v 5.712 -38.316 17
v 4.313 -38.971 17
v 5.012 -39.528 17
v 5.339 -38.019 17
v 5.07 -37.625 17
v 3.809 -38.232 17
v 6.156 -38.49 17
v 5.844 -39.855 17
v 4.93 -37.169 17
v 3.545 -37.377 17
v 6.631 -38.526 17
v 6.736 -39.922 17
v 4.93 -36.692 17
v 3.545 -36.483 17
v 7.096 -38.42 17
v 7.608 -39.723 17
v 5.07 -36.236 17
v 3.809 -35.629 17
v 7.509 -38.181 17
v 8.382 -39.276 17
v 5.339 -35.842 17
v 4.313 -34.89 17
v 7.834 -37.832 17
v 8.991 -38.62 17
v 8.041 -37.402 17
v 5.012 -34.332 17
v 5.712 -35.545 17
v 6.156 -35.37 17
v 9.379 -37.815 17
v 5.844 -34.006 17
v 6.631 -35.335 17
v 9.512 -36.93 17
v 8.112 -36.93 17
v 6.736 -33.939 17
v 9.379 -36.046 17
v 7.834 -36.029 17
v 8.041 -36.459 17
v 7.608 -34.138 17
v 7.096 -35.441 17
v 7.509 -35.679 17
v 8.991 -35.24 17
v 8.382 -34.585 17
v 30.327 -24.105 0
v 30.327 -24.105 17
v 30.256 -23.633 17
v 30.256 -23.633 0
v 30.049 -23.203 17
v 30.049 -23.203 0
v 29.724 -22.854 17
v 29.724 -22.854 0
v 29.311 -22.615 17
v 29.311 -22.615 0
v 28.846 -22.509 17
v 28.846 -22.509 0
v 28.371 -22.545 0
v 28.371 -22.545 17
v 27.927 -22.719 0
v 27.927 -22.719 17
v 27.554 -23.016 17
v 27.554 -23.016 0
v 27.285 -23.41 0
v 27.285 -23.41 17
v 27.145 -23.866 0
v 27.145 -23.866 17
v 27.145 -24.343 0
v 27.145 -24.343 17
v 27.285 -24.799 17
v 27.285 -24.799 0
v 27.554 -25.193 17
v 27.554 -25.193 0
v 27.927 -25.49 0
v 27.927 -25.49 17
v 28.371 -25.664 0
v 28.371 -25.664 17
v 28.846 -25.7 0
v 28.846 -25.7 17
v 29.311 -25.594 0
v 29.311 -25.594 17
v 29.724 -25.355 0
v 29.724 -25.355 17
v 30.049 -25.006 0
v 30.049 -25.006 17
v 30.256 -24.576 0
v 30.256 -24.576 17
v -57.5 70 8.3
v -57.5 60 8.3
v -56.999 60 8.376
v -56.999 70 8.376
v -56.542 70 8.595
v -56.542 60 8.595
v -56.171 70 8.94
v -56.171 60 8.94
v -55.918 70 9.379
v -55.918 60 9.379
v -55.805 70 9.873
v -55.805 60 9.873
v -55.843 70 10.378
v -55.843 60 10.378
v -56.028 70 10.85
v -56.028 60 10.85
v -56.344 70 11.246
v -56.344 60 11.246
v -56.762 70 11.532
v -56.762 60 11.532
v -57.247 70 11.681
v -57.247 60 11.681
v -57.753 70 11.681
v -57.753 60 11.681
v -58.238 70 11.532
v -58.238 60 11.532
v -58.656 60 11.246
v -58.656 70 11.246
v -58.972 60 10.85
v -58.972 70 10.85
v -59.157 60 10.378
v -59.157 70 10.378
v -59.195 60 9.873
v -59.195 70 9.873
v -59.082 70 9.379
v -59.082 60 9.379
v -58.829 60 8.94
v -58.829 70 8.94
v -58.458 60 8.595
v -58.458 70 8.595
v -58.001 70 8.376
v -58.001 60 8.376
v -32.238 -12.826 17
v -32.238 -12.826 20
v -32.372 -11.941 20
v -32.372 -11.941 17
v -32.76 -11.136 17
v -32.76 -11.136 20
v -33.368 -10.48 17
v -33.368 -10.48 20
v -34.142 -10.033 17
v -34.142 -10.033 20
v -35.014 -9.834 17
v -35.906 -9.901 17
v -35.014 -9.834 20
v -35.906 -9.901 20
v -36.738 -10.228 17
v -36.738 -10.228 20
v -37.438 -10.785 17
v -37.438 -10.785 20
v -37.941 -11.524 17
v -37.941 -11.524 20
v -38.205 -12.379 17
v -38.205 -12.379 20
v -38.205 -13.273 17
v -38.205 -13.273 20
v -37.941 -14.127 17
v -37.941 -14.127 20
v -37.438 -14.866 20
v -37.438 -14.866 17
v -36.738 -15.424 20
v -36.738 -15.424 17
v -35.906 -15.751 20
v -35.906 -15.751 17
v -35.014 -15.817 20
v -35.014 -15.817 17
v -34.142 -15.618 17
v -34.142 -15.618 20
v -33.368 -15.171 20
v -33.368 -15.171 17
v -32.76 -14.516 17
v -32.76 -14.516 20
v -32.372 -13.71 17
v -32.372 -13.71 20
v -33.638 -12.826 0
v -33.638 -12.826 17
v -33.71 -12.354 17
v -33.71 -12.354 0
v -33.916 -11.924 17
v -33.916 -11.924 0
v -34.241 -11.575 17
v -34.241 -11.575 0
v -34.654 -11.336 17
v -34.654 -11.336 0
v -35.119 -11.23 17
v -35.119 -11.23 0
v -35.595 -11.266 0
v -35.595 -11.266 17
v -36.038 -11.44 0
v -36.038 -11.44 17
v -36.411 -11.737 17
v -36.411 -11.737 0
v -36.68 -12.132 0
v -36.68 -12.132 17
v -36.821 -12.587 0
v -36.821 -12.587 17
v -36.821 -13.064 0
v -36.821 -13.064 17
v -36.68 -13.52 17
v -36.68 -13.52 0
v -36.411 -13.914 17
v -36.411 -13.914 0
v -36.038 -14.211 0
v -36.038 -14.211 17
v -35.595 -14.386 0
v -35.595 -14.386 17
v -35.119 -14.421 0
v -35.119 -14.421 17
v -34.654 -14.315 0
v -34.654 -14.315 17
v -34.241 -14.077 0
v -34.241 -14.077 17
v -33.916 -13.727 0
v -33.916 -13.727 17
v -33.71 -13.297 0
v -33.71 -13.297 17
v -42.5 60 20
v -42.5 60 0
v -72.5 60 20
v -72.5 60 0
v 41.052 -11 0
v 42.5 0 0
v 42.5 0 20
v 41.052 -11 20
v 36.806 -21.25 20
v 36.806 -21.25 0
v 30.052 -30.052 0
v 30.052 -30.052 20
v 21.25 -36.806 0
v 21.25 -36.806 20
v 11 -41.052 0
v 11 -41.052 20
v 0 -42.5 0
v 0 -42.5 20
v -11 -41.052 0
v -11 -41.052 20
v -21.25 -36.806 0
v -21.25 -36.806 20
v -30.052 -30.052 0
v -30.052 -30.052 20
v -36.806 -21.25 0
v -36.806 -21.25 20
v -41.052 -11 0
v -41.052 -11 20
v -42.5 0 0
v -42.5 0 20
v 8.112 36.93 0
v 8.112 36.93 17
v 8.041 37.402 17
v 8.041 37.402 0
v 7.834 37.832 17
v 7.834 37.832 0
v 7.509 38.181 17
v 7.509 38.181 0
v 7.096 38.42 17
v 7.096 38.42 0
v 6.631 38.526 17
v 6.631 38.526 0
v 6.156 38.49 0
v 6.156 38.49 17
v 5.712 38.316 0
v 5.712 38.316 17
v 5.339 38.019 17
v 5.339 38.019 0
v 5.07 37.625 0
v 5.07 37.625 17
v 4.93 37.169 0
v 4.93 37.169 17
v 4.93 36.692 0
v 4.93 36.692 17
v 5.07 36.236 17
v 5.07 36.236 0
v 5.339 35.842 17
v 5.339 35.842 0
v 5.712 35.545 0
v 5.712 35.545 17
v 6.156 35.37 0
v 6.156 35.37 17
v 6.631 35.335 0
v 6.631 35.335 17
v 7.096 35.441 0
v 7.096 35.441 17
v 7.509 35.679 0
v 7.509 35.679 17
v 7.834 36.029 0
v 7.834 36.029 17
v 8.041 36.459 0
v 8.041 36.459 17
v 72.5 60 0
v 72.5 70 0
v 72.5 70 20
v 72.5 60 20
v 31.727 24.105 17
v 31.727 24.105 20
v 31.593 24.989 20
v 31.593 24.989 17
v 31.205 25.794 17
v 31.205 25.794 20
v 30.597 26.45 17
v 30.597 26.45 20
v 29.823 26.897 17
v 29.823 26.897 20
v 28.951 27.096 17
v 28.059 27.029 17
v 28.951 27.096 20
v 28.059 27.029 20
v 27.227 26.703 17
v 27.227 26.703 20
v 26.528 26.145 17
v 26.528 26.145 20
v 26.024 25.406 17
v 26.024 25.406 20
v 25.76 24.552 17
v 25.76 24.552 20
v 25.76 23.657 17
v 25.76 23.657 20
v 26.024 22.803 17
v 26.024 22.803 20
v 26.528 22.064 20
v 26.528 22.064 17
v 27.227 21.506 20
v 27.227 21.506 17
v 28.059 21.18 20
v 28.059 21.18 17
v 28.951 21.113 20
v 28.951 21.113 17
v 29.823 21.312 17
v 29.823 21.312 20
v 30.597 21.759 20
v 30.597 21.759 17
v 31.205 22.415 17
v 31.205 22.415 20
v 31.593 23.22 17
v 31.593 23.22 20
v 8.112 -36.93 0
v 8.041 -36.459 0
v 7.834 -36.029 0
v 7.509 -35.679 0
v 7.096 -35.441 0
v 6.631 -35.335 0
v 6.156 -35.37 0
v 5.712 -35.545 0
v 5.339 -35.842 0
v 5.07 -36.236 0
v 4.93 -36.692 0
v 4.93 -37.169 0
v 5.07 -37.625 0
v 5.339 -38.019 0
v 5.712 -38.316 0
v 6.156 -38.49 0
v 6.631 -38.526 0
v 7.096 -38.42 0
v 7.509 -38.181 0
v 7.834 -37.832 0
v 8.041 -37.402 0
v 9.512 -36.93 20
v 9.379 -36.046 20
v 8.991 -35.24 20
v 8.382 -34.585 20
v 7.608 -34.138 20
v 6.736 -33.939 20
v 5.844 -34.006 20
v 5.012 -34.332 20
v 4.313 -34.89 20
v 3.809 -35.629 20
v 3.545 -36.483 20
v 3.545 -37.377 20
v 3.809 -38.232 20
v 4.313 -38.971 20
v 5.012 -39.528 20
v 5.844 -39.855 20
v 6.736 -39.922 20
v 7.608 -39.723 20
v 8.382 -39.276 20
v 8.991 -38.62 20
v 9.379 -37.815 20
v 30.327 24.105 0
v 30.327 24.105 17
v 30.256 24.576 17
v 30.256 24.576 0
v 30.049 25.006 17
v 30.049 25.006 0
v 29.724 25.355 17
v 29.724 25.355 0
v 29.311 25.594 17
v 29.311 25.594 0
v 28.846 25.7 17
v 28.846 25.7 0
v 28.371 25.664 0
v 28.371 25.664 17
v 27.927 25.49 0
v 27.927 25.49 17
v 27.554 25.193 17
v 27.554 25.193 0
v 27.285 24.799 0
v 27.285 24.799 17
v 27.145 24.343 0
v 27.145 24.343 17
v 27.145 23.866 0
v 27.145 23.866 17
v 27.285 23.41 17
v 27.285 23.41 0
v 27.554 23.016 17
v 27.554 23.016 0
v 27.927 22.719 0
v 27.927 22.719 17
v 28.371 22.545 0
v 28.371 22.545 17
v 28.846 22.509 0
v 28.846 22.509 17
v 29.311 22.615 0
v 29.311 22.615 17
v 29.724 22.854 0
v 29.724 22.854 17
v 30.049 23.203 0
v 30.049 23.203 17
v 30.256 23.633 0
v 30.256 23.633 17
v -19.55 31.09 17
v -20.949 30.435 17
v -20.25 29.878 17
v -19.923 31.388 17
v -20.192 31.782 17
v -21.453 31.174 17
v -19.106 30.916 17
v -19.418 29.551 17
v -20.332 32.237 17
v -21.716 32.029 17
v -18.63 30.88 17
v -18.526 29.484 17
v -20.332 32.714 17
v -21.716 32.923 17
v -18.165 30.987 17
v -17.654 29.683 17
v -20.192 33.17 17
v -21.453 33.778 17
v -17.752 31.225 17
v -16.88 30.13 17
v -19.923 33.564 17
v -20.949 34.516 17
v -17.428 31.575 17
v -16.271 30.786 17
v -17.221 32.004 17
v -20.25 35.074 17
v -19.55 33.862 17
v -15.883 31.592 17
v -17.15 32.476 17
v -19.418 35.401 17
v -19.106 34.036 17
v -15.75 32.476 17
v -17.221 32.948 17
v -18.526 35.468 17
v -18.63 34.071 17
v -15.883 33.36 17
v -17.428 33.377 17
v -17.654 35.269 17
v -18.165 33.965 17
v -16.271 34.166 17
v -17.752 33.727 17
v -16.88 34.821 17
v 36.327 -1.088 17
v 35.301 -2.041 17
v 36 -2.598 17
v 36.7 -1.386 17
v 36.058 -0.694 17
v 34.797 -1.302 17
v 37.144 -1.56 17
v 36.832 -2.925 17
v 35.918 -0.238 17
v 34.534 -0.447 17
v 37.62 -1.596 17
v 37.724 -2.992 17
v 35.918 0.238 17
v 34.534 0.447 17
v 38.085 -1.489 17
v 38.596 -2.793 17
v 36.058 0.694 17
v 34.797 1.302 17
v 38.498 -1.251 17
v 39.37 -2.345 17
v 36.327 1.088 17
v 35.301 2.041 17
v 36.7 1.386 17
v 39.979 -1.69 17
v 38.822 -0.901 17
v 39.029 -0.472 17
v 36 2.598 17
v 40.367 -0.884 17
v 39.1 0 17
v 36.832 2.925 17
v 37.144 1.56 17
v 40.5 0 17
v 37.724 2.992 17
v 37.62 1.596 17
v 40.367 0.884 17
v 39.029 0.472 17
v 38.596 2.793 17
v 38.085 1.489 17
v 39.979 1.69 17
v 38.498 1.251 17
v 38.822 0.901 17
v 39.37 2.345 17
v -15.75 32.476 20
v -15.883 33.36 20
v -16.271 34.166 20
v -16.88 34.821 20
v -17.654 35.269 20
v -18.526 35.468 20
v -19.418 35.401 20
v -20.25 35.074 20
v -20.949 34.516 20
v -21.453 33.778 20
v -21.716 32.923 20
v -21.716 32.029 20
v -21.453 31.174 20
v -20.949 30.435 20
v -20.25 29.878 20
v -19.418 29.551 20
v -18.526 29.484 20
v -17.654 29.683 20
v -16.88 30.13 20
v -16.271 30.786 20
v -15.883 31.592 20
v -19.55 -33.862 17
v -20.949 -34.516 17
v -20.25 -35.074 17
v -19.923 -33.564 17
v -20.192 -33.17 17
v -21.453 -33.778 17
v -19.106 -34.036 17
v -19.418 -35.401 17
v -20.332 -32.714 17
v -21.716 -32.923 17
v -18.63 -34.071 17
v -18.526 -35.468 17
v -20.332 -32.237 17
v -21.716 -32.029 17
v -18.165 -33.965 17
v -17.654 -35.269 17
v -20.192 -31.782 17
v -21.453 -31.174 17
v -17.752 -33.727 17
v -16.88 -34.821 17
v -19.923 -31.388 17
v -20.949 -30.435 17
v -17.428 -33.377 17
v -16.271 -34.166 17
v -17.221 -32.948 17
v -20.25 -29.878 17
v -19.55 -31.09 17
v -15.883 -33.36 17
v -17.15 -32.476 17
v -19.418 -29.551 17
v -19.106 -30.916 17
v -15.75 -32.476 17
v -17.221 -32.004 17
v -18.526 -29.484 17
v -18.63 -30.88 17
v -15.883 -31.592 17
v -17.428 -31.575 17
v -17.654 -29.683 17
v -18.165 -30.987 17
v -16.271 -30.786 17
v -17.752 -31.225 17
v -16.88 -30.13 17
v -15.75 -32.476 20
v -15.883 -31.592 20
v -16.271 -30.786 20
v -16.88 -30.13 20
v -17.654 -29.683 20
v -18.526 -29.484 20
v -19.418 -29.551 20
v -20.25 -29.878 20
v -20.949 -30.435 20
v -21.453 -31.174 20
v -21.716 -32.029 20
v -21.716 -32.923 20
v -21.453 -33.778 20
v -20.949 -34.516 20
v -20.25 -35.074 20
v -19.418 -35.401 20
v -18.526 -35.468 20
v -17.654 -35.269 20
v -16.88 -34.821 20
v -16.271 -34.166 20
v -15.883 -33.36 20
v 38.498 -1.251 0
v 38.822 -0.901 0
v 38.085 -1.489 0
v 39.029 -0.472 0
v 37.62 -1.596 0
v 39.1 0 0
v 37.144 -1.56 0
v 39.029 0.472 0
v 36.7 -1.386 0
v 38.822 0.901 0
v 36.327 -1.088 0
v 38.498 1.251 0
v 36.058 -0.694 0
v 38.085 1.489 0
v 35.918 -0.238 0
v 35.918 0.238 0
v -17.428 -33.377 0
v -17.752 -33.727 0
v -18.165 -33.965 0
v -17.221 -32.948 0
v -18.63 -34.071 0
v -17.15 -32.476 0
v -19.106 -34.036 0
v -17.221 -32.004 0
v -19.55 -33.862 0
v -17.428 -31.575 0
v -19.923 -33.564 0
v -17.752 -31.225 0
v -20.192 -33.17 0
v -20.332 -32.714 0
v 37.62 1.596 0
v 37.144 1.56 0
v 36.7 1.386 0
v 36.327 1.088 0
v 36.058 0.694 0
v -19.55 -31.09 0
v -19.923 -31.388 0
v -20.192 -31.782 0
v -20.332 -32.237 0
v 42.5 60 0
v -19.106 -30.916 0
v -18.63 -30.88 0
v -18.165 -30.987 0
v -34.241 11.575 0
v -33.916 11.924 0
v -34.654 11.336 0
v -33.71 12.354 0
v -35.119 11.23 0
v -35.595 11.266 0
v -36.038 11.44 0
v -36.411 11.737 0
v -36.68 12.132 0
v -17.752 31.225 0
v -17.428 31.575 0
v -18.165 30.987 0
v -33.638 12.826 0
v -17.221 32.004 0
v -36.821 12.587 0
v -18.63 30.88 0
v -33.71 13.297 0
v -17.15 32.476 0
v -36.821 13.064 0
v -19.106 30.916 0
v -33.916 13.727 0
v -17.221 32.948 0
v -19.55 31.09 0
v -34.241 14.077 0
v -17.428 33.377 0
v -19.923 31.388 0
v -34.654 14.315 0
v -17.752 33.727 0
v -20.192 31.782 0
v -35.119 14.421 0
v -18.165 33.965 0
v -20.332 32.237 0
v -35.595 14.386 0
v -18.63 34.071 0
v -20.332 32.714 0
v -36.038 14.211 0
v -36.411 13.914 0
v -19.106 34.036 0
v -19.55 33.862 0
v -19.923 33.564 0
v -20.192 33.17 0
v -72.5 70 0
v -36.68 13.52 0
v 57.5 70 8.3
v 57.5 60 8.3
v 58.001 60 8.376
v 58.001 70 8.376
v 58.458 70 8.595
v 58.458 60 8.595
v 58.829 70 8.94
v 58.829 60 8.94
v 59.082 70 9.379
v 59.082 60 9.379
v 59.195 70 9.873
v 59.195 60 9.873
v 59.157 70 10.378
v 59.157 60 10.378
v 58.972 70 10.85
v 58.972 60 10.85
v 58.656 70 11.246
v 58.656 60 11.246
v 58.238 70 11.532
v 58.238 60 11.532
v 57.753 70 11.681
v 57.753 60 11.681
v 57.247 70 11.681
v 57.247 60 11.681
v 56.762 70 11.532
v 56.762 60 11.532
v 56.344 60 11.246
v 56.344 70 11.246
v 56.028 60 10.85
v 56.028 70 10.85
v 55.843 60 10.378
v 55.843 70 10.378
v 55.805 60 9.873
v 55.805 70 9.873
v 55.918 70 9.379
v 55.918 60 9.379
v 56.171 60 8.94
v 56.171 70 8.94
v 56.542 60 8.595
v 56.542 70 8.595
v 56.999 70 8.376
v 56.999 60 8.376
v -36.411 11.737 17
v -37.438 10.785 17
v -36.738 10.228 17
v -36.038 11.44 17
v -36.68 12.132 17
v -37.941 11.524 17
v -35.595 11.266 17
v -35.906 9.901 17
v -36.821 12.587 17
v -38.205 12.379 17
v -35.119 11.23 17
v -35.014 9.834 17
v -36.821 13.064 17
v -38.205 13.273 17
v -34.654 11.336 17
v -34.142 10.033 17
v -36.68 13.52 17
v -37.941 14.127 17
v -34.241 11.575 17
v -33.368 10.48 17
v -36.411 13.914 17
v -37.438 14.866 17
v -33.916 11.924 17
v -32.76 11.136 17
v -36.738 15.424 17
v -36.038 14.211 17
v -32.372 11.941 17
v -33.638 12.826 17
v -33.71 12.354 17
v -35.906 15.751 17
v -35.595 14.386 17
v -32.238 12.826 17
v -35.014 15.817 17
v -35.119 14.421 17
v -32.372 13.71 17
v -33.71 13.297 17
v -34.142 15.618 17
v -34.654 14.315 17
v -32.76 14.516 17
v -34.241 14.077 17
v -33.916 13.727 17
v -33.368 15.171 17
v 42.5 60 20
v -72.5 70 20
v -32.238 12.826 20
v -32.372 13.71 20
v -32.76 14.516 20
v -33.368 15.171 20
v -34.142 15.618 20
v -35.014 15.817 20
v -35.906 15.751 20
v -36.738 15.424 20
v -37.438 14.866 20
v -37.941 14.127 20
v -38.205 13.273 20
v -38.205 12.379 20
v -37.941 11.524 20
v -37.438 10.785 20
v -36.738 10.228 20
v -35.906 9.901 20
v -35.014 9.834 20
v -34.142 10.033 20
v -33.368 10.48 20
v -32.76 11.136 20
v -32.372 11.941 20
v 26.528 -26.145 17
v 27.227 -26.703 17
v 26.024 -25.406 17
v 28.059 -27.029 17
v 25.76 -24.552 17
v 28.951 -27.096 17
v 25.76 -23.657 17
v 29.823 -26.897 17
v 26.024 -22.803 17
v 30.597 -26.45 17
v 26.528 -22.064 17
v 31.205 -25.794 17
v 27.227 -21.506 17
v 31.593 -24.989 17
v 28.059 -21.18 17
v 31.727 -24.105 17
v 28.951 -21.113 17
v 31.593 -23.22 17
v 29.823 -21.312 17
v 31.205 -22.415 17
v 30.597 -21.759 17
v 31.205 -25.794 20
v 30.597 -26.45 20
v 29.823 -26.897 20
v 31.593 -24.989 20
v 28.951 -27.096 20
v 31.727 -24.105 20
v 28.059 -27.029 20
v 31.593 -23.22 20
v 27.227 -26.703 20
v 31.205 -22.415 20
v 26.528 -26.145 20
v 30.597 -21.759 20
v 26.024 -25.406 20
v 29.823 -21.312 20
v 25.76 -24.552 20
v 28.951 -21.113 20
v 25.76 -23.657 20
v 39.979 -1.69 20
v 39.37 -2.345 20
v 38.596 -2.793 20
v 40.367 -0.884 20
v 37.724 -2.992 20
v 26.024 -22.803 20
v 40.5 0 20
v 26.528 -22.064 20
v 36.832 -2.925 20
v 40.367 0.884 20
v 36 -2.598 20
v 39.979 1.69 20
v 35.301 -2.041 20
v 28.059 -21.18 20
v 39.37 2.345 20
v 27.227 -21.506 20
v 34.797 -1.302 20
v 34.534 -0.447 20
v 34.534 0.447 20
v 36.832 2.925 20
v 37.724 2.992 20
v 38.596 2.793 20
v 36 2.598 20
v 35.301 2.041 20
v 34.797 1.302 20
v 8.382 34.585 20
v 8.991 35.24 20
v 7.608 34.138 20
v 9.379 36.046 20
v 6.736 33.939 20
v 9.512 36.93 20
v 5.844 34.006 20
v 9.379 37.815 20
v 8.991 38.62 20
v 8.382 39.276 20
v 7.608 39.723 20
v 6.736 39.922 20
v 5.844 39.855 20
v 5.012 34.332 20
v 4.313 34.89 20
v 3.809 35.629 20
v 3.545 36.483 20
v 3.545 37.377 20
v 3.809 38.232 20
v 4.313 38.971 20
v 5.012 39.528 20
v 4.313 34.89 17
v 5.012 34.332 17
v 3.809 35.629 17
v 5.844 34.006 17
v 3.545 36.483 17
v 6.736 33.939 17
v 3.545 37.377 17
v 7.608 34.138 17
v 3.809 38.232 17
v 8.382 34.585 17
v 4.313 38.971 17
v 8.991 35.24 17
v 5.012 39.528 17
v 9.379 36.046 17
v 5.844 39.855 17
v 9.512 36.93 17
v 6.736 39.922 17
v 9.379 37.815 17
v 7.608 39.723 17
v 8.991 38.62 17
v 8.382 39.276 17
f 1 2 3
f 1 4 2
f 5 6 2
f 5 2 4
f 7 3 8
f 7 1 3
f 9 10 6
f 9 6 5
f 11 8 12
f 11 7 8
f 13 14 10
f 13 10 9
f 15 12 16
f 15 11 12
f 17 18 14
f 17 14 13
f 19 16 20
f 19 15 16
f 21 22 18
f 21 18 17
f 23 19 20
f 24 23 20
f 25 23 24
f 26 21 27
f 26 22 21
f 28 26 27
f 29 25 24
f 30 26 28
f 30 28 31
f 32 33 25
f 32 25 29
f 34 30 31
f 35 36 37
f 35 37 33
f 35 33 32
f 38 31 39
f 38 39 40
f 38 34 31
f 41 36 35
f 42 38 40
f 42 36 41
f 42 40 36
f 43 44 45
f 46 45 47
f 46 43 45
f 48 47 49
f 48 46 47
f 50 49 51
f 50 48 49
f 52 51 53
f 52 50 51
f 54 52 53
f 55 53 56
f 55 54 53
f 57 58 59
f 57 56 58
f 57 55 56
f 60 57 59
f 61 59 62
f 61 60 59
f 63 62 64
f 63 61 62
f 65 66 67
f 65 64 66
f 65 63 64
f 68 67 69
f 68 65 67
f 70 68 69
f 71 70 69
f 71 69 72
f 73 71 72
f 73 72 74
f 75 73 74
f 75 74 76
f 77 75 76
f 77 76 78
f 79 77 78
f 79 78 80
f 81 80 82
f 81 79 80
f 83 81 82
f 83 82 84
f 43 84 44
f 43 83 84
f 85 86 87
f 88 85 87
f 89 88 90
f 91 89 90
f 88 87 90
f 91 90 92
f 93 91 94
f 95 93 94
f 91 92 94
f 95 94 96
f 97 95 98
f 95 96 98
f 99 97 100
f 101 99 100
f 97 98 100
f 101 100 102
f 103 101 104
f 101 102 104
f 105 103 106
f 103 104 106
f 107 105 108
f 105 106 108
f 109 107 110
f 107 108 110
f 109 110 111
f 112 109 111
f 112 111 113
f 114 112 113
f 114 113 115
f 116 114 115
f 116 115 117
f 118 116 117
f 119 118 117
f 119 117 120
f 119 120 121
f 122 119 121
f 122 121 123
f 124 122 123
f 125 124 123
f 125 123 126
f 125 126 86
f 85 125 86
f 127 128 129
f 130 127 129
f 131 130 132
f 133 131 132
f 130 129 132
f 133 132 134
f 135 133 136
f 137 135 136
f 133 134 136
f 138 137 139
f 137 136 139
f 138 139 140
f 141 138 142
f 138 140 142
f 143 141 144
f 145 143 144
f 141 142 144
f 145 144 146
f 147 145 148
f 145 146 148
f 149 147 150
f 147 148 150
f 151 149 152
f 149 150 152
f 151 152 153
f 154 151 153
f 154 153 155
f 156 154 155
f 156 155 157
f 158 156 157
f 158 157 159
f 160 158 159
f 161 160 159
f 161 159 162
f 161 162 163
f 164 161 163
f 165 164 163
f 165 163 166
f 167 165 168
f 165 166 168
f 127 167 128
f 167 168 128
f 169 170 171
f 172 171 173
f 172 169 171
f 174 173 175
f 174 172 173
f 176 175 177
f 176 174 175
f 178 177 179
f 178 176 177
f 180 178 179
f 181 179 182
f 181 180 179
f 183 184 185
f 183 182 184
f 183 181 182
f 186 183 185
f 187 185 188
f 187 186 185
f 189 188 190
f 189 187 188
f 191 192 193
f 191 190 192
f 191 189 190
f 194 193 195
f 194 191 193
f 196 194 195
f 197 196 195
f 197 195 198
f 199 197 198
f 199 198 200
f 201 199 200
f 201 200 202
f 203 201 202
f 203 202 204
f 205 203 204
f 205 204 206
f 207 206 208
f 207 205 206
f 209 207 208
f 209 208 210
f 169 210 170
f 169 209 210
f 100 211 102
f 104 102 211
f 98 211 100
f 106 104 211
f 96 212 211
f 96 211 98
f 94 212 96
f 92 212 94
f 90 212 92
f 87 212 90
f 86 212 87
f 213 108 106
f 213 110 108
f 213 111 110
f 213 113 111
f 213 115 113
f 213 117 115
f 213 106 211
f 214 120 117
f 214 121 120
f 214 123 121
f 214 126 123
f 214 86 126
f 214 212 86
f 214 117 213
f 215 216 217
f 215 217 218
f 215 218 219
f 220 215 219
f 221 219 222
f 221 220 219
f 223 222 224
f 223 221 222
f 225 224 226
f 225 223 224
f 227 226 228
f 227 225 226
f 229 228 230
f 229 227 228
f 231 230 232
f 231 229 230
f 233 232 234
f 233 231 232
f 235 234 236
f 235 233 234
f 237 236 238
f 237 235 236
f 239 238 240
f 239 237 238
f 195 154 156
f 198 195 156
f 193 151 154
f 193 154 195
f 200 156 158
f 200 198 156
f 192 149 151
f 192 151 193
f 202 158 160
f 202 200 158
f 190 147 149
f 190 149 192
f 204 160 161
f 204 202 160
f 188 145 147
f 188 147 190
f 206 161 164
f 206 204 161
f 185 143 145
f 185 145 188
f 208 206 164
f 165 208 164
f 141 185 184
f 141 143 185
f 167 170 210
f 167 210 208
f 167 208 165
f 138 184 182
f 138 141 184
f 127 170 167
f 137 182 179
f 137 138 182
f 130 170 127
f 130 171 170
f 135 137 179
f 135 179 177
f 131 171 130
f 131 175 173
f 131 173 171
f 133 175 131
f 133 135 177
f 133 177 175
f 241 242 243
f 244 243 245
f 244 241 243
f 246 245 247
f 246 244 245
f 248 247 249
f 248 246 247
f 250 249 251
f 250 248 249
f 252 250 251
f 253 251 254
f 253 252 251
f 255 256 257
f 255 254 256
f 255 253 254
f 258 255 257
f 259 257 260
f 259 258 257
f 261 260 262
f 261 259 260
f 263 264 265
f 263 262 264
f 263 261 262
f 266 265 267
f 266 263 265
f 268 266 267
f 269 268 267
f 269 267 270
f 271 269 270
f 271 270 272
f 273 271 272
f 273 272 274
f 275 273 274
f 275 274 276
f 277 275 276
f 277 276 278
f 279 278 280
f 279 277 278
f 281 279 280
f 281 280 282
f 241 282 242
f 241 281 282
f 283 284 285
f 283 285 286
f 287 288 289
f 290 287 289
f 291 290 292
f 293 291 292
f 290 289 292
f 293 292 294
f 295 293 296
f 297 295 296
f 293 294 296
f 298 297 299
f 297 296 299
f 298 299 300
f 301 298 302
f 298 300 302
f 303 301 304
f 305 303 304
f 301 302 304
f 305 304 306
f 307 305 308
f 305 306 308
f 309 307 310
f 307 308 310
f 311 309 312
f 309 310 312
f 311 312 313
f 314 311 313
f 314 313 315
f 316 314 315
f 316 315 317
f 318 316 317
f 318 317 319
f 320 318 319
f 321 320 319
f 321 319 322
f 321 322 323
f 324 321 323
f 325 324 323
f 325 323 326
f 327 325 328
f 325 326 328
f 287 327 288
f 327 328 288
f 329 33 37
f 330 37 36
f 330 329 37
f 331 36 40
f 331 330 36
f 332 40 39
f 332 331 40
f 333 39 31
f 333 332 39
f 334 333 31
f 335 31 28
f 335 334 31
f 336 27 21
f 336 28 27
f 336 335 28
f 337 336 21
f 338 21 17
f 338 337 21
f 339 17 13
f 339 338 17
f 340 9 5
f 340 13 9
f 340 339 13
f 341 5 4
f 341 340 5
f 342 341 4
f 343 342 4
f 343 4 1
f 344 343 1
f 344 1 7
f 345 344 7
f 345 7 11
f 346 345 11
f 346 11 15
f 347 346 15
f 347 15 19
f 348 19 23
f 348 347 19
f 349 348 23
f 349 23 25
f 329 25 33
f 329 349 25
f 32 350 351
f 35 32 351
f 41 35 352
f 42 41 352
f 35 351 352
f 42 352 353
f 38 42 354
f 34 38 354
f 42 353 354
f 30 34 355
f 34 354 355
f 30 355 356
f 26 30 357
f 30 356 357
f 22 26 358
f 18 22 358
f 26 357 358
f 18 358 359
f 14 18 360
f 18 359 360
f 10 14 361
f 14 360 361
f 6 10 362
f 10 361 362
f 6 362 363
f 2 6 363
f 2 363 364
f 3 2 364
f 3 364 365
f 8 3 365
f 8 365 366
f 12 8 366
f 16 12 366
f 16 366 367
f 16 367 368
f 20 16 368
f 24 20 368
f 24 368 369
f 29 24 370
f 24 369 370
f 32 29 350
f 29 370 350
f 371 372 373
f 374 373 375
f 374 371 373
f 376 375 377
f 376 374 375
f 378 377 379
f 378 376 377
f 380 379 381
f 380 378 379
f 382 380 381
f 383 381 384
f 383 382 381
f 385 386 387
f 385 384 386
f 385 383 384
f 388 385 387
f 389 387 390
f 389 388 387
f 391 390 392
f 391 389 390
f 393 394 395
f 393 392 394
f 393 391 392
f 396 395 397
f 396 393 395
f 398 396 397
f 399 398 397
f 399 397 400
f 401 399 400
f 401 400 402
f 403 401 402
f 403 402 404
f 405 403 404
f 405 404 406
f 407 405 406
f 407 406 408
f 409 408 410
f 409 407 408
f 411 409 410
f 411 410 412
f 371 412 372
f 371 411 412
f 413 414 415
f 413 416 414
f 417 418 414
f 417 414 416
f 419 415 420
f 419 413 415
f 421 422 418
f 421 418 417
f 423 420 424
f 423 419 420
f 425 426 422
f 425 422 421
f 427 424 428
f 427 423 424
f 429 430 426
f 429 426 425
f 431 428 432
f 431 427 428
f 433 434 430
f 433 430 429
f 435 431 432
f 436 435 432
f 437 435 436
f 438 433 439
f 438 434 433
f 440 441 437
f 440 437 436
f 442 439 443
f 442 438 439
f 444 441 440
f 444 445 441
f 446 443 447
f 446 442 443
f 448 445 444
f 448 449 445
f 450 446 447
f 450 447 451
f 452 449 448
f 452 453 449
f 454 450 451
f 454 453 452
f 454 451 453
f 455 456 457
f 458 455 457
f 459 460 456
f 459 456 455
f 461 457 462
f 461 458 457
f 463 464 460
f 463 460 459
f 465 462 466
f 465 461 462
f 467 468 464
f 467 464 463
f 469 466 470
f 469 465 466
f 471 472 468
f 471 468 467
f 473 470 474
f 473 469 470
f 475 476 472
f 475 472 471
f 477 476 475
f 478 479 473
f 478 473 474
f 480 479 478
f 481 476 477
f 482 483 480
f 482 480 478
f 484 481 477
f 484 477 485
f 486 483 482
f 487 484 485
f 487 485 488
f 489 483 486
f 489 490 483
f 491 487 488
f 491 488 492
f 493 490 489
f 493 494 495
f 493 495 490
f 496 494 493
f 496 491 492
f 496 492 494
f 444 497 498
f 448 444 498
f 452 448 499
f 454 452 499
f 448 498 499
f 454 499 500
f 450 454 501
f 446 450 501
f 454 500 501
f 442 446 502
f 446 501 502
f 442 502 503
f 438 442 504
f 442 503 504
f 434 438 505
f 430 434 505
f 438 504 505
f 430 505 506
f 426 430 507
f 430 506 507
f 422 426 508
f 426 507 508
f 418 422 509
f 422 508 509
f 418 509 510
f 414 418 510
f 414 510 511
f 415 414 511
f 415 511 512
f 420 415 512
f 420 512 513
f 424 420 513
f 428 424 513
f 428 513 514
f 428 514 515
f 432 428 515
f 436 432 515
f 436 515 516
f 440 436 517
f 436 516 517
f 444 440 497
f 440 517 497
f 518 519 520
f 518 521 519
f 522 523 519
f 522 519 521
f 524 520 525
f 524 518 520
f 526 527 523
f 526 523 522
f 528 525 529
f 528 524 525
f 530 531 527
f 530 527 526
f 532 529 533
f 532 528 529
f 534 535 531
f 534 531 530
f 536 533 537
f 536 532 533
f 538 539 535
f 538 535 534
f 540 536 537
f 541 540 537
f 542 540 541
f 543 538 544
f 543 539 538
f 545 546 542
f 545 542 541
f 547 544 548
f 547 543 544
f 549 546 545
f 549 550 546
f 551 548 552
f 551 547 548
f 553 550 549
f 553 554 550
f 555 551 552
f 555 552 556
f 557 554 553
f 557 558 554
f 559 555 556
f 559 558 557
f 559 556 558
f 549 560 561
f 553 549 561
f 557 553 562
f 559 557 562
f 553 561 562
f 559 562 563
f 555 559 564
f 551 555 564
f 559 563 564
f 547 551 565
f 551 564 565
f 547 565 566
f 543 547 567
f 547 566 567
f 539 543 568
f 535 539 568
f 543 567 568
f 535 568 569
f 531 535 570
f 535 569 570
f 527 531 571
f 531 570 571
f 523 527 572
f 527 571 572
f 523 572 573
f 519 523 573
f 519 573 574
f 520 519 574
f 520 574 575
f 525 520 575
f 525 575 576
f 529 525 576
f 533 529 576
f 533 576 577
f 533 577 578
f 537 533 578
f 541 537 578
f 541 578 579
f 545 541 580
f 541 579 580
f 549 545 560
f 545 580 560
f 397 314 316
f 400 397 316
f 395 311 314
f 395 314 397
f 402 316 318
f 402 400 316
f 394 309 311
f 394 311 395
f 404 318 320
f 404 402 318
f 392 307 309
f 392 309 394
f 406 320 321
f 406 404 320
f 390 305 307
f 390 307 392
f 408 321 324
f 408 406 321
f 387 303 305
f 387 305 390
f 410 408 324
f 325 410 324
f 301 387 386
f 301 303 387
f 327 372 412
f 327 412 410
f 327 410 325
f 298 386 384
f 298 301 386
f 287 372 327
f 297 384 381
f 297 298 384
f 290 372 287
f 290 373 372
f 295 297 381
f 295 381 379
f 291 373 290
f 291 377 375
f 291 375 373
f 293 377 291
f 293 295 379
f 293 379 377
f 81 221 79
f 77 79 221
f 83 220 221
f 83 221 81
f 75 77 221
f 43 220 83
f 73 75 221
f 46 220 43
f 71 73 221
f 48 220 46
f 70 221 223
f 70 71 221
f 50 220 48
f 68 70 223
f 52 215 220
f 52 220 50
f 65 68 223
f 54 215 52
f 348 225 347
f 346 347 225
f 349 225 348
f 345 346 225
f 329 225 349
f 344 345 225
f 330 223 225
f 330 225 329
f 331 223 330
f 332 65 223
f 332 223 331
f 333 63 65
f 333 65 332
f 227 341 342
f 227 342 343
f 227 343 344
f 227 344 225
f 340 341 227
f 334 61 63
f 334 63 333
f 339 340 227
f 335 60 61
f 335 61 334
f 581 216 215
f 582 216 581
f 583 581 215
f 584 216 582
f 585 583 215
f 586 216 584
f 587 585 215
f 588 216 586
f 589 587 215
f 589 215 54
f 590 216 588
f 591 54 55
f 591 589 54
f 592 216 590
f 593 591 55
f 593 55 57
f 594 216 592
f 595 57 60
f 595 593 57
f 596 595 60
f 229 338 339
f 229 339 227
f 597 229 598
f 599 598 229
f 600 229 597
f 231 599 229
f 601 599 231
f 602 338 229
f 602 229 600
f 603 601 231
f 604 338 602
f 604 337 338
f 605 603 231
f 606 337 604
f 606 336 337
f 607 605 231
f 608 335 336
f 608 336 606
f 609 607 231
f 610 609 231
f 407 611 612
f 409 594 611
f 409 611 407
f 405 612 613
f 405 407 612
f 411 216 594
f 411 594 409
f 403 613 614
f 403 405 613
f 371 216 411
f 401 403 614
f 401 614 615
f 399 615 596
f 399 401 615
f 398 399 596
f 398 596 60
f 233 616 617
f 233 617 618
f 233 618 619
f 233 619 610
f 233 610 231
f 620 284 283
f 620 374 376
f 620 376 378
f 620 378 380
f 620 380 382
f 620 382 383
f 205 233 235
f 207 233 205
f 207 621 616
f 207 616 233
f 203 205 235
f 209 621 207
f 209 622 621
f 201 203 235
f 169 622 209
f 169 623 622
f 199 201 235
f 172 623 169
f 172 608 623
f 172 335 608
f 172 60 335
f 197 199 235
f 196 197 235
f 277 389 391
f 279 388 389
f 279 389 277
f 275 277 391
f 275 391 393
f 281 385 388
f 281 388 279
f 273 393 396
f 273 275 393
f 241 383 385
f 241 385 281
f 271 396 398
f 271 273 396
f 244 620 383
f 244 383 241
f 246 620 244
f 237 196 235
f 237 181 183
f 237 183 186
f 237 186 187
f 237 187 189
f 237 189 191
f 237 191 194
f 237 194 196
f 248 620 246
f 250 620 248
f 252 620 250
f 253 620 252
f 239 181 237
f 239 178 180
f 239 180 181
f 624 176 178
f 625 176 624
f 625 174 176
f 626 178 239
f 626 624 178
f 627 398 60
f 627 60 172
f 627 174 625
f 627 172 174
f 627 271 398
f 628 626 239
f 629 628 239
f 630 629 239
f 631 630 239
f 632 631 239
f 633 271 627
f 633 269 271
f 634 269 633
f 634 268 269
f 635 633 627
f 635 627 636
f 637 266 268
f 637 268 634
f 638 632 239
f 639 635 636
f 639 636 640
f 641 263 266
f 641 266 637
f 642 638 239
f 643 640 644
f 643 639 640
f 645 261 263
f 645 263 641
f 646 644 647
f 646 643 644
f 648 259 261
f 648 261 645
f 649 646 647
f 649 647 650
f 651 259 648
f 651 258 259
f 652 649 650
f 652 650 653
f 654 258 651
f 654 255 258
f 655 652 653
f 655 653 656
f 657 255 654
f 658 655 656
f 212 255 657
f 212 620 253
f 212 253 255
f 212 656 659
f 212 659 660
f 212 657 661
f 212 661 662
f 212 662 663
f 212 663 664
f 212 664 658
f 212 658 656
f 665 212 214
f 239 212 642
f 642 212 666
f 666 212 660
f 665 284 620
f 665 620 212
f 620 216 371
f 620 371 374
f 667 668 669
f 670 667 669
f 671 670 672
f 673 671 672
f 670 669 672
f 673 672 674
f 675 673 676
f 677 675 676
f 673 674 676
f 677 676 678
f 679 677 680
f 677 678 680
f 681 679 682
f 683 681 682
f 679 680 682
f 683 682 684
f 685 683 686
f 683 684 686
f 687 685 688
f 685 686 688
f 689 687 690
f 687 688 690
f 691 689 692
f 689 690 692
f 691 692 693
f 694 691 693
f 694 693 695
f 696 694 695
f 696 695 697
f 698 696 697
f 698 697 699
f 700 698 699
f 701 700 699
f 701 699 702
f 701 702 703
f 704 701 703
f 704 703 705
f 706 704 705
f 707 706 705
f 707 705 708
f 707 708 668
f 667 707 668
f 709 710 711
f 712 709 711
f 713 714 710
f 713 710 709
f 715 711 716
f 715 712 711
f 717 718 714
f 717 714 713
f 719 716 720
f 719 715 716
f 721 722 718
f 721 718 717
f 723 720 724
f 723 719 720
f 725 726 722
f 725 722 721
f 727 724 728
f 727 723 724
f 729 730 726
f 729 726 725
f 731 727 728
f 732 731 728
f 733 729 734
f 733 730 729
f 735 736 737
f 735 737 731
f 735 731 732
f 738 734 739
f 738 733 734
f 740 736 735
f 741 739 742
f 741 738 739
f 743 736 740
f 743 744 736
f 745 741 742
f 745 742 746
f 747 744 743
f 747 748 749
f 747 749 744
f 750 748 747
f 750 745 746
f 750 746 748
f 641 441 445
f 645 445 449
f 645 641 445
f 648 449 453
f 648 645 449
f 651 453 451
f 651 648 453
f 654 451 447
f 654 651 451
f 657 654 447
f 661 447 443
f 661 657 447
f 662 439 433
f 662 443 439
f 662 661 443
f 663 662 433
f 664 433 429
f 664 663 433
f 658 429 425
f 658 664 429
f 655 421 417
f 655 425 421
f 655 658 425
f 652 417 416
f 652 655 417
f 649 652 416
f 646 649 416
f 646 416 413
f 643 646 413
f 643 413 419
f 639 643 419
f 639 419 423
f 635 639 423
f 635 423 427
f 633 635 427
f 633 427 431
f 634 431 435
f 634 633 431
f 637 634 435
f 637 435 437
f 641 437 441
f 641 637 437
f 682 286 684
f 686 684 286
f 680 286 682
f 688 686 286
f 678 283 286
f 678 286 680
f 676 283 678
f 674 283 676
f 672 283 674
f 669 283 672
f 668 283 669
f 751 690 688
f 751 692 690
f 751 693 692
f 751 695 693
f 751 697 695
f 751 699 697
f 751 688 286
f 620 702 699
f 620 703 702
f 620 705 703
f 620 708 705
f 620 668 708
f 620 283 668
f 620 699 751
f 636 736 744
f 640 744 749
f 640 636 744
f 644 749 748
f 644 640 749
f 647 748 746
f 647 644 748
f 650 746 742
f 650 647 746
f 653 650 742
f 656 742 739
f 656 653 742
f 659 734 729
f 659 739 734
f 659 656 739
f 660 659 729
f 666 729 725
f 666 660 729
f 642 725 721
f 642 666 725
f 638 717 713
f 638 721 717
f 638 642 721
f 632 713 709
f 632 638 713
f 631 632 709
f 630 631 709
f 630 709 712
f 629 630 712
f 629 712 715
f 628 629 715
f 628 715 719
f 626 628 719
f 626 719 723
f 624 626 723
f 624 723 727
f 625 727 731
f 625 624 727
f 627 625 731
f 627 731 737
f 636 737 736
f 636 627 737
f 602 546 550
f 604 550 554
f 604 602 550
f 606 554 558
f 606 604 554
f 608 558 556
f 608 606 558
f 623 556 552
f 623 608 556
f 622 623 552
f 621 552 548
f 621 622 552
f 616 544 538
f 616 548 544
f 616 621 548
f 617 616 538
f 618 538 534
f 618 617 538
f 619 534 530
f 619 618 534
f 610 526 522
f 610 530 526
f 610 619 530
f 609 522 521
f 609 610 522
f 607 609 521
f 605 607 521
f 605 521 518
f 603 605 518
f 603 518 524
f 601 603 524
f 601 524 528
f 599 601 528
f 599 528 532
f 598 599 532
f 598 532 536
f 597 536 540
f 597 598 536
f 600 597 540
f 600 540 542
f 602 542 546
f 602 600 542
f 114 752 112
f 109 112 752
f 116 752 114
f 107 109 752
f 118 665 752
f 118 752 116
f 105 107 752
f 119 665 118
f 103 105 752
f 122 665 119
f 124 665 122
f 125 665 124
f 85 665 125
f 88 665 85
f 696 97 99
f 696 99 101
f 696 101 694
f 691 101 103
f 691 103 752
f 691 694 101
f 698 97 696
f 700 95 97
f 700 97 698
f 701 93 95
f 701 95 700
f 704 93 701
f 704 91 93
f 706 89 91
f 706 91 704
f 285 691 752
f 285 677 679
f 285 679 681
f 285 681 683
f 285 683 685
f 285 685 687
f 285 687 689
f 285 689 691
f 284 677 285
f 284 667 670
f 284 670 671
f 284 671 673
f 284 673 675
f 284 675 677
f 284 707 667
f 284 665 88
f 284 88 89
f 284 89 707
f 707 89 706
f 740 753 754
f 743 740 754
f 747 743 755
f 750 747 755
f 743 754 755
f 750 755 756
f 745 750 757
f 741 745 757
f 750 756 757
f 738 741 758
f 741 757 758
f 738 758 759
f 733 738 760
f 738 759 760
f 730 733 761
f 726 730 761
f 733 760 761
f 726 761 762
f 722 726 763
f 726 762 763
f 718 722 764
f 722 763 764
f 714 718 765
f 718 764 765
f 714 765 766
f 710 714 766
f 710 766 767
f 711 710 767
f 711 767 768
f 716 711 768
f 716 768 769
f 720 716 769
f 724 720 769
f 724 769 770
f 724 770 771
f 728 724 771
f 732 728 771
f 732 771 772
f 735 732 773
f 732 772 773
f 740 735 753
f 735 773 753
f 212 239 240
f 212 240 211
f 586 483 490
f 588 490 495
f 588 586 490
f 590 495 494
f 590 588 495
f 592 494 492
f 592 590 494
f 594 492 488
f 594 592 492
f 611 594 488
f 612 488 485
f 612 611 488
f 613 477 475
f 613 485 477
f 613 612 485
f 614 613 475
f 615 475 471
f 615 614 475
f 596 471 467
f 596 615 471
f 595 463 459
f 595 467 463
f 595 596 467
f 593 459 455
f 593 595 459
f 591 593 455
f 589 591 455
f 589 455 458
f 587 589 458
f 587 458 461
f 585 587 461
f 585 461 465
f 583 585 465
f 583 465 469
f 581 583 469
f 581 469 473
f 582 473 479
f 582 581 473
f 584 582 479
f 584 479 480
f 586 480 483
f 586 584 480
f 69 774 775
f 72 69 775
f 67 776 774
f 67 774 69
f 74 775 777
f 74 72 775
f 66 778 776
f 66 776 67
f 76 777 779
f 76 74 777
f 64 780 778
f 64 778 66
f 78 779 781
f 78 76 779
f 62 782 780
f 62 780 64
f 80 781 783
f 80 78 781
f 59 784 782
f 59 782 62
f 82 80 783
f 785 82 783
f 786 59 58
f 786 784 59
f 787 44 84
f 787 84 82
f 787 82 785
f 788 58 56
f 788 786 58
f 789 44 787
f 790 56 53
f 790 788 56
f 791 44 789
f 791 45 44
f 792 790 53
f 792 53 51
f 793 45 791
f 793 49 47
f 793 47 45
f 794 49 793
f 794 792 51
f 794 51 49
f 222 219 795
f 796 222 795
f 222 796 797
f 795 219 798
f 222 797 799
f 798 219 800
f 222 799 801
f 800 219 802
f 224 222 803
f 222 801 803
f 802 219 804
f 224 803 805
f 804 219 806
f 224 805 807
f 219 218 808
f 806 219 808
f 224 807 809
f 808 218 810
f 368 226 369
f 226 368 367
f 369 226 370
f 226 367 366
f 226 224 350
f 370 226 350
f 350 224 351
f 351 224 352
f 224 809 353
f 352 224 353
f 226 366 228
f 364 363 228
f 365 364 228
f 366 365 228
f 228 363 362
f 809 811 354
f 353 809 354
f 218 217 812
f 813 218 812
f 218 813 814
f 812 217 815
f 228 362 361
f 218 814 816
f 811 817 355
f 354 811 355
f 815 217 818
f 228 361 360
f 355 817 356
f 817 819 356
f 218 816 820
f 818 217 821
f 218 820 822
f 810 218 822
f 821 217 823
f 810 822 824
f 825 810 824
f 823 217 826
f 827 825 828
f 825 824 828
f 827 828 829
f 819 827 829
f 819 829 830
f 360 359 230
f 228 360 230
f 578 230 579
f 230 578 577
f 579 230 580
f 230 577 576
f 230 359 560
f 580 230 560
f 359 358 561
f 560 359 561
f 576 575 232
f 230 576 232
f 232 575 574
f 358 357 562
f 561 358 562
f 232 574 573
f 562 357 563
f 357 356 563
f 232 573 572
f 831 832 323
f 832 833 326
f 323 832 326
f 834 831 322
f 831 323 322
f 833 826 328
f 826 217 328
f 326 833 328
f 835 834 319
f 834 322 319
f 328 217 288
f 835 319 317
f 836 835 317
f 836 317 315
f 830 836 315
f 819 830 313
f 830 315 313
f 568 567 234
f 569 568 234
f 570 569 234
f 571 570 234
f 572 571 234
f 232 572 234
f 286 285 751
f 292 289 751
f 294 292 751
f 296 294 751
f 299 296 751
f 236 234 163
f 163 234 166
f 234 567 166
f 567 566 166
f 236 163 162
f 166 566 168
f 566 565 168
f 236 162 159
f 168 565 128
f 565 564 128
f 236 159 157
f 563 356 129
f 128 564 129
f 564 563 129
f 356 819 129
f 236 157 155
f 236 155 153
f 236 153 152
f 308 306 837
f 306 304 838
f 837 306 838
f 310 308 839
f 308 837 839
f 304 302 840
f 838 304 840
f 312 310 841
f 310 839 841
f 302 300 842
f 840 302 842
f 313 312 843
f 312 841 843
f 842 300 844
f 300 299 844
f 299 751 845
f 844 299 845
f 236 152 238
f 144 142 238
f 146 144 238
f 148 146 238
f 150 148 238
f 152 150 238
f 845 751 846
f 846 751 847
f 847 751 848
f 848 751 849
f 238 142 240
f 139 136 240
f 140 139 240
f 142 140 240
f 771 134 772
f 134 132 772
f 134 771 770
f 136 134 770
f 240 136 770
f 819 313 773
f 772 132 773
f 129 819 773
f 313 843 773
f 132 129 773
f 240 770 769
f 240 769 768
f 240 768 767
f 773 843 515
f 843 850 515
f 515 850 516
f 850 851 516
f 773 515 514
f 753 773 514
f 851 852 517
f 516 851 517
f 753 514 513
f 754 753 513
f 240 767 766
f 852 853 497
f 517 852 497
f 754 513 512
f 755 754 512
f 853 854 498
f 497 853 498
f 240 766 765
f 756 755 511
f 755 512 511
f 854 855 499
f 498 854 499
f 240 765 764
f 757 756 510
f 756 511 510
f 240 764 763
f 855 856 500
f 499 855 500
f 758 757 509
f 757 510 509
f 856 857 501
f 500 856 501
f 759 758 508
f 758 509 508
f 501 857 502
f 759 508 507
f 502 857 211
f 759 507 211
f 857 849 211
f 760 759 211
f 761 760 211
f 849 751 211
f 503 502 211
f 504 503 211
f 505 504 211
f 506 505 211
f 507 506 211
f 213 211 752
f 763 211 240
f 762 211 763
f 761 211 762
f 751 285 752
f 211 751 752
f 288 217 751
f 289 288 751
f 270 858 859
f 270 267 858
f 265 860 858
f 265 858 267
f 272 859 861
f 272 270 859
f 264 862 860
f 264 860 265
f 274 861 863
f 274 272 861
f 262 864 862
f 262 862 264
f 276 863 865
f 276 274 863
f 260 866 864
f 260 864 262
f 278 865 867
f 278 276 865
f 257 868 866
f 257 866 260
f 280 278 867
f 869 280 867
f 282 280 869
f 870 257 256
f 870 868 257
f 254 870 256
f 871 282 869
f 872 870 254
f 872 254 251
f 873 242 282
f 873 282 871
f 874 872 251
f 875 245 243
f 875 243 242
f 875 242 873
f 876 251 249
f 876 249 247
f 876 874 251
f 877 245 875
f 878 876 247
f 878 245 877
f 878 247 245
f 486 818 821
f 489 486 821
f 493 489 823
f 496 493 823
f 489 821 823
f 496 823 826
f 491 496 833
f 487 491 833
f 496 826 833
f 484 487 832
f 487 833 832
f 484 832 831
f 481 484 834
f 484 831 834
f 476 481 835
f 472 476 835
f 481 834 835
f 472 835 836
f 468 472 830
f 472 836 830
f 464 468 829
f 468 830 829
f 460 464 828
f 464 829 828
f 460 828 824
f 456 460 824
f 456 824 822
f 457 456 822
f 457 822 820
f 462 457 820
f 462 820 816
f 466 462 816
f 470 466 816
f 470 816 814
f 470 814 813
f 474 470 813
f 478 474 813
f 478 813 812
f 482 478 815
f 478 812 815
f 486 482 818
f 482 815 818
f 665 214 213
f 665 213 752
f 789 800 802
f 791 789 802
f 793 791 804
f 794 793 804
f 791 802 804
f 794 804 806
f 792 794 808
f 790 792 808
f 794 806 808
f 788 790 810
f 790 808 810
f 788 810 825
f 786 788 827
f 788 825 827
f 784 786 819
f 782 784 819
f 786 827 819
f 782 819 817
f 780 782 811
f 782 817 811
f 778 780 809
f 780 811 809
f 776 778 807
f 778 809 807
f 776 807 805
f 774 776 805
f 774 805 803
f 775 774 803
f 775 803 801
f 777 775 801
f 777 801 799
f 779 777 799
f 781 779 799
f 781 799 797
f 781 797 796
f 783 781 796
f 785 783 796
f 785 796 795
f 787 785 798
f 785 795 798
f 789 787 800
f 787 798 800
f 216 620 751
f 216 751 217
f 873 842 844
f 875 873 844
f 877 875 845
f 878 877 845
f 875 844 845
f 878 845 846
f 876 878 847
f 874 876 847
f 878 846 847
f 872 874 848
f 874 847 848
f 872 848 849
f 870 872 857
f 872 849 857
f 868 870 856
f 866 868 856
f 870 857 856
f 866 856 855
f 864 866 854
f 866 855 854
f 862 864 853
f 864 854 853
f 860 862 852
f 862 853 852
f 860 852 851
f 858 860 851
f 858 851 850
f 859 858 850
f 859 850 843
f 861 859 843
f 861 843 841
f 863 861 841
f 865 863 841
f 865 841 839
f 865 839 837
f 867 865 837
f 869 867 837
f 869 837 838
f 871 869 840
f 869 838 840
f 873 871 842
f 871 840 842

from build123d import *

# Parameters (mm, degrees)
SKETCH1_R           = 1.6
BOSS_EXTRUDE2_DEPTH = 20
SKETCH2_R           = 3
CUT_EXTRUDE1_DEPTH  = 3
SKETCH3_R           = 1.7
CUT_EXTRUDE2_DEPTH  = 128.131821351


with BuildPart() as part:
    # Sketch1 → Boss-Extrude2 (new body)
    with BuildSketch(Plane.XY):
        with BuildLine():
            Line((-42.5, 0), (-42.5, 60))
            Line((-42.5, 60), (-72.5, 60))
            Line((-72.5, 60), (-72.5, 70))
            Line((-72.5, 70), (72.5, 70))
            Line((72.5, 70), (72.5, 60))
            Line((72.5, 60), (42.5, 60))
            Line((42.5, 60), (42.5, 0))
            ThreePointArc((42.5, 0), (0, -42.5), (-42.5, 0))
        make_face()
        with Locations((37.5, 0)):
            Circle(SKETCH1_R, mode=Mode.SUBTRACT)
        with Locations((28.726666617, -24.104535363)):
            Circle(SKETCH1_R, mode=Mode.SUBTRACT)
        with Locations((6.511806663, -36.930290738)):
            Circle(SKETCH1_R, mode=Mode.SUBTRACT)
        with Locations((-18.75, -32.475952642)):
            Circle(SKETCH1_R, mode=Mode.SUBTRACT)
        with Locations((-35.238473279, -12.825755375)):
            Circle(SKETCH1_R, mode=Mode.SUBTRACT)
        with Locations((-35.238473279, 12.825755375)):
            Circle(SKETCH1_R, mode=Mode.SUBTRACT)
        with Locations((-18.75, 32.475952642)):
            Circle(SKETCH1_R, mode=Mode.SUBTRACT)
        with Locations((6.511806663, 36.930290738)):
            Circle(SKETCH1_R, mode=Mode.SUBTRACT)
        with Locations((28.726666617, 24.104535363)):
            Circle(SKETCH1_R, mode=Mode.SUBTRACT)
    extrude(amount=BOSS_EXTRUDE2_DEPTH)

    # Sketch2 → Cut-Extrude1 (cut)
    with BuildSketch(Plane.XY.offset(20)):
        with Locations((6.511806663, 36.930290738)):
            Circle(SKETCH2_R)
        with Locations((28.726666617, 24.104535363)):
            Circle(SKETCH2_R)
        with Locations((37.5, 0)):
            Circle(SKETCH2_R)
        with Locations((28.726666617, -24.104535363)):
            Circle(SKETCH2_R)
        with Locations((6.511806663, -36.930290738)):
            Circle(SKETCH2_R)
        with Locations((-18.75, -32.475952642)):
            Circle(SKETCH2_R)
        with Locations((-35.238473279, -12.825755375)):
            Circle(SKETCH2_R)
        with Locations((-35.238473279, 12.825755375)):
            Circle(SKETCH2_R)
        with Locations((-18.75, 32.475952642)):
            Circle(SKETCH2_R)
    extrude(amount=-CUT_EXTRUDE1_DEPTH, mode=Mode.SUBTRACT)

    # Sketch3 → Cut-Extrude2 (cut, through all)
    with BuildSketch(Plane.XZ.offset(-60)):
        with Locations(Location((57.5, 10, 0), (0, 0, 270))):
            Circle(SKETCH3_R)
        with Locations(Location((-57.5, 10, 0), (0, 0, 270))):
            Circle(SKETCH3_R)
    extrude(amount=-CUT_EXTRUDE2_DEPTH, mode=Mode.SUBTRACT)


solid = part.part
